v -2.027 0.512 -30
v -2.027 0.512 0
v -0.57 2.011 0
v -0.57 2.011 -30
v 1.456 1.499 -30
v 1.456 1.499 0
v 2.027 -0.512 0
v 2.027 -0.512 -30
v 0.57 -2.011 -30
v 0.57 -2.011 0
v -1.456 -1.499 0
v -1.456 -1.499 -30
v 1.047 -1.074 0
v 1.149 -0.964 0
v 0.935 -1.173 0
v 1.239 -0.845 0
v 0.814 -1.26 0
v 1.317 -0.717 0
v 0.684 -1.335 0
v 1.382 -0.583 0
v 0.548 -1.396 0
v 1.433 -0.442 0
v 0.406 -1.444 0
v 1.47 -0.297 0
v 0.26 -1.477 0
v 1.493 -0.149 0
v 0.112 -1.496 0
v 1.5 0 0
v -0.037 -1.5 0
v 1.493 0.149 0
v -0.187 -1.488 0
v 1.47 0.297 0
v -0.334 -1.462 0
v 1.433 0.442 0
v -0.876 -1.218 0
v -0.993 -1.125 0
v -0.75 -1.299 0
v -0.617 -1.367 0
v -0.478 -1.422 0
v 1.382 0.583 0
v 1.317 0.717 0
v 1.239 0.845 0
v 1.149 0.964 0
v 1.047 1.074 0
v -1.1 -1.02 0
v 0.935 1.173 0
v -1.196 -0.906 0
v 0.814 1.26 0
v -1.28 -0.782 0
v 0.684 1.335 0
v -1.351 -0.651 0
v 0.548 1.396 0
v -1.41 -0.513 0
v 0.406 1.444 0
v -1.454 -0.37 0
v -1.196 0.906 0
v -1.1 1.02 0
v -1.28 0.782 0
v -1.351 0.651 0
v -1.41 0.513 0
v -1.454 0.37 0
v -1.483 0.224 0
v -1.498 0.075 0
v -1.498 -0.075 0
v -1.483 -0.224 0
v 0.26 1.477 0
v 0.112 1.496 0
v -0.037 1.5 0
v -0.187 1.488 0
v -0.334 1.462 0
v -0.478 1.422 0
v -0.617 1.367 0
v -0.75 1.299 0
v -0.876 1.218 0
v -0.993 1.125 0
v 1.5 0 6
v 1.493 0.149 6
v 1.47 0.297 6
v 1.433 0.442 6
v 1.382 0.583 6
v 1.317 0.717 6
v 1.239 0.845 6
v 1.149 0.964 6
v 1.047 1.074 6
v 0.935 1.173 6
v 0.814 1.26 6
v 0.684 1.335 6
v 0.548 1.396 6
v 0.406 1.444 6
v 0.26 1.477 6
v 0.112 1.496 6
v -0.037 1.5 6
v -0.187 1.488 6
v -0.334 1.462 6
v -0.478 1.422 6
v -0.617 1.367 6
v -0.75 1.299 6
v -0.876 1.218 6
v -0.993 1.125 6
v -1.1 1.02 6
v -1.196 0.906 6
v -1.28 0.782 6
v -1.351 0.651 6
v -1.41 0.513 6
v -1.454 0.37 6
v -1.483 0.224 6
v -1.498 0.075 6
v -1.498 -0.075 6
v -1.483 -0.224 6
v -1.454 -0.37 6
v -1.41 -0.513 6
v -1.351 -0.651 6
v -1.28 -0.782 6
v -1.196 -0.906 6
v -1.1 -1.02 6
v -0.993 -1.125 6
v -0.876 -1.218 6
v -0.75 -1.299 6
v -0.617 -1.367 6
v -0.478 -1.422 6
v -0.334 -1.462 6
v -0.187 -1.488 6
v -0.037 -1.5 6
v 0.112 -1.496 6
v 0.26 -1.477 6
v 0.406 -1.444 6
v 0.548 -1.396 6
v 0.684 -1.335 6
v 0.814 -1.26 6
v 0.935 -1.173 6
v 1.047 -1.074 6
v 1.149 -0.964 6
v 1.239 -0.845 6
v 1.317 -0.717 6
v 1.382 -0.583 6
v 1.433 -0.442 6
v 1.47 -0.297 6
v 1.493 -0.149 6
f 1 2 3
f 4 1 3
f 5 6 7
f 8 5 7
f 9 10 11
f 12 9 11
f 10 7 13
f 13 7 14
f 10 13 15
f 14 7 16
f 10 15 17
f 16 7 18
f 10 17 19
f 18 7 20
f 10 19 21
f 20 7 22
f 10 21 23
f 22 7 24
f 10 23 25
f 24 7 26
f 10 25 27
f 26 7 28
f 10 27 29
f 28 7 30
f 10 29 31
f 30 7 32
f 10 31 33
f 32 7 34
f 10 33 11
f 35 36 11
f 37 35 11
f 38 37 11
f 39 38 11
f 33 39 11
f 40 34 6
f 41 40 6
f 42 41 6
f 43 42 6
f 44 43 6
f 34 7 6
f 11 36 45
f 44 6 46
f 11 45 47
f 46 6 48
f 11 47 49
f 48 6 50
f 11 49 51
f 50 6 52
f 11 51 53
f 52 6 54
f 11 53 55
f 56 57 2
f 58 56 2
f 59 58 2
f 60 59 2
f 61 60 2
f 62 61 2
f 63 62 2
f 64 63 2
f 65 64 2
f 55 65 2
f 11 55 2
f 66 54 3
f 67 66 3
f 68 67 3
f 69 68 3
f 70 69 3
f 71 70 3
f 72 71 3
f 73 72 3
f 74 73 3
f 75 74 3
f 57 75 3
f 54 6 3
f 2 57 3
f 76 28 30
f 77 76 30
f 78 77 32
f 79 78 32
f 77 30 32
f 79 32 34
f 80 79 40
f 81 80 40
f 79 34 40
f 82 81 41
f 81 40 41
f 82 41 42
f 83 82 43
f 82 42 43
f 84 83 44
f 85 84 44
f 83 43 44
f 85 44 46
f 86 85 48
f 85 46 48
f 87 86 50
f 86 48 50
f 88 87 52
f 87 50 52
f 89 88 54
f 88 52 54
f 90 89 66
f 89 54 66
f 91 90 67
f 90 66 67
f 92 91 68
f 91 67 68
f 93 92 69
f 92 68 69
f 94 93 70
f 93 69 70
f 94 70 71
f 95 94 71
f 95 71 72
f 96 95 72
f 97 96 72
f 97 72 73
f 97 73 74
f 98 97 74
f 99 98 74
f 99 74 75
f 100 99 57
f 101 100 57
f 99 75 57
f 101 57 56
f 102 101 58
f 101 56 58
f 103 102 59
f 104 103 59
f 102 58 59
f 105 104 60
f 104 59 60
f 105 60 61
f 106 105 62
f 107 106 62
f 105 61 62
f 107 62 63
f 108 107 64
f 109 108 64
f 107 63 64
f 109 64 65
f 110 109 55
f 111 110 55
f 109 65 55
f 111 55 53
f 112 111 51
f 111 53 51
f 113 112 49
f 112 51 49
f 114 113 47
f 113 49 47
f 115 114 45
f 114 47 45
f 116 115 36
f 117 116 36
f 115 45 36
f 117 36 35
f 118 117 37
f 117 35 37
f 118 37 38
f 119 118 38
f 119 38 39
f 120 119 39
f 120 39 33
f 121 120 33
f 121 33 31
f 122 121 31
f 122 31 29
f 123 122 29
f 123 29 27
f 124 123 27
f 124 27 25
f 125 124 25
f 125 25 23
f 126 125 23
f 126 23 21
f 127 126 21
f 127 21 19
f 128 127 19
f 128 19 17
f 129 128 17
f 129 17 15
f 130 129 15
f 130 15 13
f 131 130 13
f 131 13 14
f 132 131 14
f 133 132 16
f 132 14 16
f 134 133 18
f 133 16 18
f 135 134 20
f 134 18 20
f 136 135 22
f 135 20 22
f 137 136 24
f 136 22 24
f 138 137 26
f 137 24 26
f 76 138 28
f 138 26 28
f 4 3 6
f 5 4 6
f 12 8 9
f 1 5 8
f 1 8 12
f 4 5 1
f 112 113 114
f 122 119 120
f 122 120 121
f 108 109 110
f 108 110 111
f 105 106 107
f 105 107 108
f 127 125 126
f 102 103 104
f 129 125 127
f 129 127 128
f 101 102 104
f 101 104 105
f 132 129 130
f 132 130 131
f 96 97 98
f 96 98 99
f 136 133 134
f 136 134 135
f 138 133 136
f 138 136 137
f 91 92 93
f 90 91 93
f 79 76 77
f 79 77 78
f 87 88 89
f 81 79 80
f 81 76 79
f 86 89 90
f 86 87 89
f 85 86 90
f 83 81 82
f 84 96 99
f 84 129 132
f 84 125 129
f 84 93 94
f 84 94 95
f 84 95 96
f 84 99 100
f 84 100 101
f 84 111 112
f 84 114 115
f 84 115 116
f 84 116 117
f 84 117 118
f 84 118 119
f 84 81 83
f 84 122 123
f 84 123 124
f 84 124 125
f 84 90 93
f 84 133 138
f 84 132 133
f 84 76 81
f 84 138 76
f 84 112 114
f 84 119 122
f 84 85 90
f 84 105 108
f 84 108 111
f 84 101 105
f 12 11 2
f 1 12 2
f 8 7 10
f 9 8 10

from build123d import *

# Parameters (mm, degrees)
SKETCH_1_R      = 1.5
EXTRUDE_1_DEPTH = 6
EXTRUDE_2_DEPTH = 30


with BuildPart() as part:
    # 草图1 → 凸台-拉伸1 (new body)
    with BuildSketch(Plane.XY):
        Circle(SKETCH_1_R)
    extrude(amount=EXTRUDE_1_DEPTH)

    # 草图2 → 凸台-拉伸2 (add)
    with BuildSketch(Plane(origin=(0, 0, 0), x_dir=(-1, 0, 0), z_dir=(0, 0, -1))):
        Polygon((1.456280061, -1.49922127), (2.026503736, 0.511564893), (0.570223675, 2.010786163), (-1.456280061, 1.49922127), (-2.026503736, -0.511564893), (-0.570223675, -2.010786163), align=None)
    extrude(amount=EXTRUDE_2_DEPTH)


solid = part.part
